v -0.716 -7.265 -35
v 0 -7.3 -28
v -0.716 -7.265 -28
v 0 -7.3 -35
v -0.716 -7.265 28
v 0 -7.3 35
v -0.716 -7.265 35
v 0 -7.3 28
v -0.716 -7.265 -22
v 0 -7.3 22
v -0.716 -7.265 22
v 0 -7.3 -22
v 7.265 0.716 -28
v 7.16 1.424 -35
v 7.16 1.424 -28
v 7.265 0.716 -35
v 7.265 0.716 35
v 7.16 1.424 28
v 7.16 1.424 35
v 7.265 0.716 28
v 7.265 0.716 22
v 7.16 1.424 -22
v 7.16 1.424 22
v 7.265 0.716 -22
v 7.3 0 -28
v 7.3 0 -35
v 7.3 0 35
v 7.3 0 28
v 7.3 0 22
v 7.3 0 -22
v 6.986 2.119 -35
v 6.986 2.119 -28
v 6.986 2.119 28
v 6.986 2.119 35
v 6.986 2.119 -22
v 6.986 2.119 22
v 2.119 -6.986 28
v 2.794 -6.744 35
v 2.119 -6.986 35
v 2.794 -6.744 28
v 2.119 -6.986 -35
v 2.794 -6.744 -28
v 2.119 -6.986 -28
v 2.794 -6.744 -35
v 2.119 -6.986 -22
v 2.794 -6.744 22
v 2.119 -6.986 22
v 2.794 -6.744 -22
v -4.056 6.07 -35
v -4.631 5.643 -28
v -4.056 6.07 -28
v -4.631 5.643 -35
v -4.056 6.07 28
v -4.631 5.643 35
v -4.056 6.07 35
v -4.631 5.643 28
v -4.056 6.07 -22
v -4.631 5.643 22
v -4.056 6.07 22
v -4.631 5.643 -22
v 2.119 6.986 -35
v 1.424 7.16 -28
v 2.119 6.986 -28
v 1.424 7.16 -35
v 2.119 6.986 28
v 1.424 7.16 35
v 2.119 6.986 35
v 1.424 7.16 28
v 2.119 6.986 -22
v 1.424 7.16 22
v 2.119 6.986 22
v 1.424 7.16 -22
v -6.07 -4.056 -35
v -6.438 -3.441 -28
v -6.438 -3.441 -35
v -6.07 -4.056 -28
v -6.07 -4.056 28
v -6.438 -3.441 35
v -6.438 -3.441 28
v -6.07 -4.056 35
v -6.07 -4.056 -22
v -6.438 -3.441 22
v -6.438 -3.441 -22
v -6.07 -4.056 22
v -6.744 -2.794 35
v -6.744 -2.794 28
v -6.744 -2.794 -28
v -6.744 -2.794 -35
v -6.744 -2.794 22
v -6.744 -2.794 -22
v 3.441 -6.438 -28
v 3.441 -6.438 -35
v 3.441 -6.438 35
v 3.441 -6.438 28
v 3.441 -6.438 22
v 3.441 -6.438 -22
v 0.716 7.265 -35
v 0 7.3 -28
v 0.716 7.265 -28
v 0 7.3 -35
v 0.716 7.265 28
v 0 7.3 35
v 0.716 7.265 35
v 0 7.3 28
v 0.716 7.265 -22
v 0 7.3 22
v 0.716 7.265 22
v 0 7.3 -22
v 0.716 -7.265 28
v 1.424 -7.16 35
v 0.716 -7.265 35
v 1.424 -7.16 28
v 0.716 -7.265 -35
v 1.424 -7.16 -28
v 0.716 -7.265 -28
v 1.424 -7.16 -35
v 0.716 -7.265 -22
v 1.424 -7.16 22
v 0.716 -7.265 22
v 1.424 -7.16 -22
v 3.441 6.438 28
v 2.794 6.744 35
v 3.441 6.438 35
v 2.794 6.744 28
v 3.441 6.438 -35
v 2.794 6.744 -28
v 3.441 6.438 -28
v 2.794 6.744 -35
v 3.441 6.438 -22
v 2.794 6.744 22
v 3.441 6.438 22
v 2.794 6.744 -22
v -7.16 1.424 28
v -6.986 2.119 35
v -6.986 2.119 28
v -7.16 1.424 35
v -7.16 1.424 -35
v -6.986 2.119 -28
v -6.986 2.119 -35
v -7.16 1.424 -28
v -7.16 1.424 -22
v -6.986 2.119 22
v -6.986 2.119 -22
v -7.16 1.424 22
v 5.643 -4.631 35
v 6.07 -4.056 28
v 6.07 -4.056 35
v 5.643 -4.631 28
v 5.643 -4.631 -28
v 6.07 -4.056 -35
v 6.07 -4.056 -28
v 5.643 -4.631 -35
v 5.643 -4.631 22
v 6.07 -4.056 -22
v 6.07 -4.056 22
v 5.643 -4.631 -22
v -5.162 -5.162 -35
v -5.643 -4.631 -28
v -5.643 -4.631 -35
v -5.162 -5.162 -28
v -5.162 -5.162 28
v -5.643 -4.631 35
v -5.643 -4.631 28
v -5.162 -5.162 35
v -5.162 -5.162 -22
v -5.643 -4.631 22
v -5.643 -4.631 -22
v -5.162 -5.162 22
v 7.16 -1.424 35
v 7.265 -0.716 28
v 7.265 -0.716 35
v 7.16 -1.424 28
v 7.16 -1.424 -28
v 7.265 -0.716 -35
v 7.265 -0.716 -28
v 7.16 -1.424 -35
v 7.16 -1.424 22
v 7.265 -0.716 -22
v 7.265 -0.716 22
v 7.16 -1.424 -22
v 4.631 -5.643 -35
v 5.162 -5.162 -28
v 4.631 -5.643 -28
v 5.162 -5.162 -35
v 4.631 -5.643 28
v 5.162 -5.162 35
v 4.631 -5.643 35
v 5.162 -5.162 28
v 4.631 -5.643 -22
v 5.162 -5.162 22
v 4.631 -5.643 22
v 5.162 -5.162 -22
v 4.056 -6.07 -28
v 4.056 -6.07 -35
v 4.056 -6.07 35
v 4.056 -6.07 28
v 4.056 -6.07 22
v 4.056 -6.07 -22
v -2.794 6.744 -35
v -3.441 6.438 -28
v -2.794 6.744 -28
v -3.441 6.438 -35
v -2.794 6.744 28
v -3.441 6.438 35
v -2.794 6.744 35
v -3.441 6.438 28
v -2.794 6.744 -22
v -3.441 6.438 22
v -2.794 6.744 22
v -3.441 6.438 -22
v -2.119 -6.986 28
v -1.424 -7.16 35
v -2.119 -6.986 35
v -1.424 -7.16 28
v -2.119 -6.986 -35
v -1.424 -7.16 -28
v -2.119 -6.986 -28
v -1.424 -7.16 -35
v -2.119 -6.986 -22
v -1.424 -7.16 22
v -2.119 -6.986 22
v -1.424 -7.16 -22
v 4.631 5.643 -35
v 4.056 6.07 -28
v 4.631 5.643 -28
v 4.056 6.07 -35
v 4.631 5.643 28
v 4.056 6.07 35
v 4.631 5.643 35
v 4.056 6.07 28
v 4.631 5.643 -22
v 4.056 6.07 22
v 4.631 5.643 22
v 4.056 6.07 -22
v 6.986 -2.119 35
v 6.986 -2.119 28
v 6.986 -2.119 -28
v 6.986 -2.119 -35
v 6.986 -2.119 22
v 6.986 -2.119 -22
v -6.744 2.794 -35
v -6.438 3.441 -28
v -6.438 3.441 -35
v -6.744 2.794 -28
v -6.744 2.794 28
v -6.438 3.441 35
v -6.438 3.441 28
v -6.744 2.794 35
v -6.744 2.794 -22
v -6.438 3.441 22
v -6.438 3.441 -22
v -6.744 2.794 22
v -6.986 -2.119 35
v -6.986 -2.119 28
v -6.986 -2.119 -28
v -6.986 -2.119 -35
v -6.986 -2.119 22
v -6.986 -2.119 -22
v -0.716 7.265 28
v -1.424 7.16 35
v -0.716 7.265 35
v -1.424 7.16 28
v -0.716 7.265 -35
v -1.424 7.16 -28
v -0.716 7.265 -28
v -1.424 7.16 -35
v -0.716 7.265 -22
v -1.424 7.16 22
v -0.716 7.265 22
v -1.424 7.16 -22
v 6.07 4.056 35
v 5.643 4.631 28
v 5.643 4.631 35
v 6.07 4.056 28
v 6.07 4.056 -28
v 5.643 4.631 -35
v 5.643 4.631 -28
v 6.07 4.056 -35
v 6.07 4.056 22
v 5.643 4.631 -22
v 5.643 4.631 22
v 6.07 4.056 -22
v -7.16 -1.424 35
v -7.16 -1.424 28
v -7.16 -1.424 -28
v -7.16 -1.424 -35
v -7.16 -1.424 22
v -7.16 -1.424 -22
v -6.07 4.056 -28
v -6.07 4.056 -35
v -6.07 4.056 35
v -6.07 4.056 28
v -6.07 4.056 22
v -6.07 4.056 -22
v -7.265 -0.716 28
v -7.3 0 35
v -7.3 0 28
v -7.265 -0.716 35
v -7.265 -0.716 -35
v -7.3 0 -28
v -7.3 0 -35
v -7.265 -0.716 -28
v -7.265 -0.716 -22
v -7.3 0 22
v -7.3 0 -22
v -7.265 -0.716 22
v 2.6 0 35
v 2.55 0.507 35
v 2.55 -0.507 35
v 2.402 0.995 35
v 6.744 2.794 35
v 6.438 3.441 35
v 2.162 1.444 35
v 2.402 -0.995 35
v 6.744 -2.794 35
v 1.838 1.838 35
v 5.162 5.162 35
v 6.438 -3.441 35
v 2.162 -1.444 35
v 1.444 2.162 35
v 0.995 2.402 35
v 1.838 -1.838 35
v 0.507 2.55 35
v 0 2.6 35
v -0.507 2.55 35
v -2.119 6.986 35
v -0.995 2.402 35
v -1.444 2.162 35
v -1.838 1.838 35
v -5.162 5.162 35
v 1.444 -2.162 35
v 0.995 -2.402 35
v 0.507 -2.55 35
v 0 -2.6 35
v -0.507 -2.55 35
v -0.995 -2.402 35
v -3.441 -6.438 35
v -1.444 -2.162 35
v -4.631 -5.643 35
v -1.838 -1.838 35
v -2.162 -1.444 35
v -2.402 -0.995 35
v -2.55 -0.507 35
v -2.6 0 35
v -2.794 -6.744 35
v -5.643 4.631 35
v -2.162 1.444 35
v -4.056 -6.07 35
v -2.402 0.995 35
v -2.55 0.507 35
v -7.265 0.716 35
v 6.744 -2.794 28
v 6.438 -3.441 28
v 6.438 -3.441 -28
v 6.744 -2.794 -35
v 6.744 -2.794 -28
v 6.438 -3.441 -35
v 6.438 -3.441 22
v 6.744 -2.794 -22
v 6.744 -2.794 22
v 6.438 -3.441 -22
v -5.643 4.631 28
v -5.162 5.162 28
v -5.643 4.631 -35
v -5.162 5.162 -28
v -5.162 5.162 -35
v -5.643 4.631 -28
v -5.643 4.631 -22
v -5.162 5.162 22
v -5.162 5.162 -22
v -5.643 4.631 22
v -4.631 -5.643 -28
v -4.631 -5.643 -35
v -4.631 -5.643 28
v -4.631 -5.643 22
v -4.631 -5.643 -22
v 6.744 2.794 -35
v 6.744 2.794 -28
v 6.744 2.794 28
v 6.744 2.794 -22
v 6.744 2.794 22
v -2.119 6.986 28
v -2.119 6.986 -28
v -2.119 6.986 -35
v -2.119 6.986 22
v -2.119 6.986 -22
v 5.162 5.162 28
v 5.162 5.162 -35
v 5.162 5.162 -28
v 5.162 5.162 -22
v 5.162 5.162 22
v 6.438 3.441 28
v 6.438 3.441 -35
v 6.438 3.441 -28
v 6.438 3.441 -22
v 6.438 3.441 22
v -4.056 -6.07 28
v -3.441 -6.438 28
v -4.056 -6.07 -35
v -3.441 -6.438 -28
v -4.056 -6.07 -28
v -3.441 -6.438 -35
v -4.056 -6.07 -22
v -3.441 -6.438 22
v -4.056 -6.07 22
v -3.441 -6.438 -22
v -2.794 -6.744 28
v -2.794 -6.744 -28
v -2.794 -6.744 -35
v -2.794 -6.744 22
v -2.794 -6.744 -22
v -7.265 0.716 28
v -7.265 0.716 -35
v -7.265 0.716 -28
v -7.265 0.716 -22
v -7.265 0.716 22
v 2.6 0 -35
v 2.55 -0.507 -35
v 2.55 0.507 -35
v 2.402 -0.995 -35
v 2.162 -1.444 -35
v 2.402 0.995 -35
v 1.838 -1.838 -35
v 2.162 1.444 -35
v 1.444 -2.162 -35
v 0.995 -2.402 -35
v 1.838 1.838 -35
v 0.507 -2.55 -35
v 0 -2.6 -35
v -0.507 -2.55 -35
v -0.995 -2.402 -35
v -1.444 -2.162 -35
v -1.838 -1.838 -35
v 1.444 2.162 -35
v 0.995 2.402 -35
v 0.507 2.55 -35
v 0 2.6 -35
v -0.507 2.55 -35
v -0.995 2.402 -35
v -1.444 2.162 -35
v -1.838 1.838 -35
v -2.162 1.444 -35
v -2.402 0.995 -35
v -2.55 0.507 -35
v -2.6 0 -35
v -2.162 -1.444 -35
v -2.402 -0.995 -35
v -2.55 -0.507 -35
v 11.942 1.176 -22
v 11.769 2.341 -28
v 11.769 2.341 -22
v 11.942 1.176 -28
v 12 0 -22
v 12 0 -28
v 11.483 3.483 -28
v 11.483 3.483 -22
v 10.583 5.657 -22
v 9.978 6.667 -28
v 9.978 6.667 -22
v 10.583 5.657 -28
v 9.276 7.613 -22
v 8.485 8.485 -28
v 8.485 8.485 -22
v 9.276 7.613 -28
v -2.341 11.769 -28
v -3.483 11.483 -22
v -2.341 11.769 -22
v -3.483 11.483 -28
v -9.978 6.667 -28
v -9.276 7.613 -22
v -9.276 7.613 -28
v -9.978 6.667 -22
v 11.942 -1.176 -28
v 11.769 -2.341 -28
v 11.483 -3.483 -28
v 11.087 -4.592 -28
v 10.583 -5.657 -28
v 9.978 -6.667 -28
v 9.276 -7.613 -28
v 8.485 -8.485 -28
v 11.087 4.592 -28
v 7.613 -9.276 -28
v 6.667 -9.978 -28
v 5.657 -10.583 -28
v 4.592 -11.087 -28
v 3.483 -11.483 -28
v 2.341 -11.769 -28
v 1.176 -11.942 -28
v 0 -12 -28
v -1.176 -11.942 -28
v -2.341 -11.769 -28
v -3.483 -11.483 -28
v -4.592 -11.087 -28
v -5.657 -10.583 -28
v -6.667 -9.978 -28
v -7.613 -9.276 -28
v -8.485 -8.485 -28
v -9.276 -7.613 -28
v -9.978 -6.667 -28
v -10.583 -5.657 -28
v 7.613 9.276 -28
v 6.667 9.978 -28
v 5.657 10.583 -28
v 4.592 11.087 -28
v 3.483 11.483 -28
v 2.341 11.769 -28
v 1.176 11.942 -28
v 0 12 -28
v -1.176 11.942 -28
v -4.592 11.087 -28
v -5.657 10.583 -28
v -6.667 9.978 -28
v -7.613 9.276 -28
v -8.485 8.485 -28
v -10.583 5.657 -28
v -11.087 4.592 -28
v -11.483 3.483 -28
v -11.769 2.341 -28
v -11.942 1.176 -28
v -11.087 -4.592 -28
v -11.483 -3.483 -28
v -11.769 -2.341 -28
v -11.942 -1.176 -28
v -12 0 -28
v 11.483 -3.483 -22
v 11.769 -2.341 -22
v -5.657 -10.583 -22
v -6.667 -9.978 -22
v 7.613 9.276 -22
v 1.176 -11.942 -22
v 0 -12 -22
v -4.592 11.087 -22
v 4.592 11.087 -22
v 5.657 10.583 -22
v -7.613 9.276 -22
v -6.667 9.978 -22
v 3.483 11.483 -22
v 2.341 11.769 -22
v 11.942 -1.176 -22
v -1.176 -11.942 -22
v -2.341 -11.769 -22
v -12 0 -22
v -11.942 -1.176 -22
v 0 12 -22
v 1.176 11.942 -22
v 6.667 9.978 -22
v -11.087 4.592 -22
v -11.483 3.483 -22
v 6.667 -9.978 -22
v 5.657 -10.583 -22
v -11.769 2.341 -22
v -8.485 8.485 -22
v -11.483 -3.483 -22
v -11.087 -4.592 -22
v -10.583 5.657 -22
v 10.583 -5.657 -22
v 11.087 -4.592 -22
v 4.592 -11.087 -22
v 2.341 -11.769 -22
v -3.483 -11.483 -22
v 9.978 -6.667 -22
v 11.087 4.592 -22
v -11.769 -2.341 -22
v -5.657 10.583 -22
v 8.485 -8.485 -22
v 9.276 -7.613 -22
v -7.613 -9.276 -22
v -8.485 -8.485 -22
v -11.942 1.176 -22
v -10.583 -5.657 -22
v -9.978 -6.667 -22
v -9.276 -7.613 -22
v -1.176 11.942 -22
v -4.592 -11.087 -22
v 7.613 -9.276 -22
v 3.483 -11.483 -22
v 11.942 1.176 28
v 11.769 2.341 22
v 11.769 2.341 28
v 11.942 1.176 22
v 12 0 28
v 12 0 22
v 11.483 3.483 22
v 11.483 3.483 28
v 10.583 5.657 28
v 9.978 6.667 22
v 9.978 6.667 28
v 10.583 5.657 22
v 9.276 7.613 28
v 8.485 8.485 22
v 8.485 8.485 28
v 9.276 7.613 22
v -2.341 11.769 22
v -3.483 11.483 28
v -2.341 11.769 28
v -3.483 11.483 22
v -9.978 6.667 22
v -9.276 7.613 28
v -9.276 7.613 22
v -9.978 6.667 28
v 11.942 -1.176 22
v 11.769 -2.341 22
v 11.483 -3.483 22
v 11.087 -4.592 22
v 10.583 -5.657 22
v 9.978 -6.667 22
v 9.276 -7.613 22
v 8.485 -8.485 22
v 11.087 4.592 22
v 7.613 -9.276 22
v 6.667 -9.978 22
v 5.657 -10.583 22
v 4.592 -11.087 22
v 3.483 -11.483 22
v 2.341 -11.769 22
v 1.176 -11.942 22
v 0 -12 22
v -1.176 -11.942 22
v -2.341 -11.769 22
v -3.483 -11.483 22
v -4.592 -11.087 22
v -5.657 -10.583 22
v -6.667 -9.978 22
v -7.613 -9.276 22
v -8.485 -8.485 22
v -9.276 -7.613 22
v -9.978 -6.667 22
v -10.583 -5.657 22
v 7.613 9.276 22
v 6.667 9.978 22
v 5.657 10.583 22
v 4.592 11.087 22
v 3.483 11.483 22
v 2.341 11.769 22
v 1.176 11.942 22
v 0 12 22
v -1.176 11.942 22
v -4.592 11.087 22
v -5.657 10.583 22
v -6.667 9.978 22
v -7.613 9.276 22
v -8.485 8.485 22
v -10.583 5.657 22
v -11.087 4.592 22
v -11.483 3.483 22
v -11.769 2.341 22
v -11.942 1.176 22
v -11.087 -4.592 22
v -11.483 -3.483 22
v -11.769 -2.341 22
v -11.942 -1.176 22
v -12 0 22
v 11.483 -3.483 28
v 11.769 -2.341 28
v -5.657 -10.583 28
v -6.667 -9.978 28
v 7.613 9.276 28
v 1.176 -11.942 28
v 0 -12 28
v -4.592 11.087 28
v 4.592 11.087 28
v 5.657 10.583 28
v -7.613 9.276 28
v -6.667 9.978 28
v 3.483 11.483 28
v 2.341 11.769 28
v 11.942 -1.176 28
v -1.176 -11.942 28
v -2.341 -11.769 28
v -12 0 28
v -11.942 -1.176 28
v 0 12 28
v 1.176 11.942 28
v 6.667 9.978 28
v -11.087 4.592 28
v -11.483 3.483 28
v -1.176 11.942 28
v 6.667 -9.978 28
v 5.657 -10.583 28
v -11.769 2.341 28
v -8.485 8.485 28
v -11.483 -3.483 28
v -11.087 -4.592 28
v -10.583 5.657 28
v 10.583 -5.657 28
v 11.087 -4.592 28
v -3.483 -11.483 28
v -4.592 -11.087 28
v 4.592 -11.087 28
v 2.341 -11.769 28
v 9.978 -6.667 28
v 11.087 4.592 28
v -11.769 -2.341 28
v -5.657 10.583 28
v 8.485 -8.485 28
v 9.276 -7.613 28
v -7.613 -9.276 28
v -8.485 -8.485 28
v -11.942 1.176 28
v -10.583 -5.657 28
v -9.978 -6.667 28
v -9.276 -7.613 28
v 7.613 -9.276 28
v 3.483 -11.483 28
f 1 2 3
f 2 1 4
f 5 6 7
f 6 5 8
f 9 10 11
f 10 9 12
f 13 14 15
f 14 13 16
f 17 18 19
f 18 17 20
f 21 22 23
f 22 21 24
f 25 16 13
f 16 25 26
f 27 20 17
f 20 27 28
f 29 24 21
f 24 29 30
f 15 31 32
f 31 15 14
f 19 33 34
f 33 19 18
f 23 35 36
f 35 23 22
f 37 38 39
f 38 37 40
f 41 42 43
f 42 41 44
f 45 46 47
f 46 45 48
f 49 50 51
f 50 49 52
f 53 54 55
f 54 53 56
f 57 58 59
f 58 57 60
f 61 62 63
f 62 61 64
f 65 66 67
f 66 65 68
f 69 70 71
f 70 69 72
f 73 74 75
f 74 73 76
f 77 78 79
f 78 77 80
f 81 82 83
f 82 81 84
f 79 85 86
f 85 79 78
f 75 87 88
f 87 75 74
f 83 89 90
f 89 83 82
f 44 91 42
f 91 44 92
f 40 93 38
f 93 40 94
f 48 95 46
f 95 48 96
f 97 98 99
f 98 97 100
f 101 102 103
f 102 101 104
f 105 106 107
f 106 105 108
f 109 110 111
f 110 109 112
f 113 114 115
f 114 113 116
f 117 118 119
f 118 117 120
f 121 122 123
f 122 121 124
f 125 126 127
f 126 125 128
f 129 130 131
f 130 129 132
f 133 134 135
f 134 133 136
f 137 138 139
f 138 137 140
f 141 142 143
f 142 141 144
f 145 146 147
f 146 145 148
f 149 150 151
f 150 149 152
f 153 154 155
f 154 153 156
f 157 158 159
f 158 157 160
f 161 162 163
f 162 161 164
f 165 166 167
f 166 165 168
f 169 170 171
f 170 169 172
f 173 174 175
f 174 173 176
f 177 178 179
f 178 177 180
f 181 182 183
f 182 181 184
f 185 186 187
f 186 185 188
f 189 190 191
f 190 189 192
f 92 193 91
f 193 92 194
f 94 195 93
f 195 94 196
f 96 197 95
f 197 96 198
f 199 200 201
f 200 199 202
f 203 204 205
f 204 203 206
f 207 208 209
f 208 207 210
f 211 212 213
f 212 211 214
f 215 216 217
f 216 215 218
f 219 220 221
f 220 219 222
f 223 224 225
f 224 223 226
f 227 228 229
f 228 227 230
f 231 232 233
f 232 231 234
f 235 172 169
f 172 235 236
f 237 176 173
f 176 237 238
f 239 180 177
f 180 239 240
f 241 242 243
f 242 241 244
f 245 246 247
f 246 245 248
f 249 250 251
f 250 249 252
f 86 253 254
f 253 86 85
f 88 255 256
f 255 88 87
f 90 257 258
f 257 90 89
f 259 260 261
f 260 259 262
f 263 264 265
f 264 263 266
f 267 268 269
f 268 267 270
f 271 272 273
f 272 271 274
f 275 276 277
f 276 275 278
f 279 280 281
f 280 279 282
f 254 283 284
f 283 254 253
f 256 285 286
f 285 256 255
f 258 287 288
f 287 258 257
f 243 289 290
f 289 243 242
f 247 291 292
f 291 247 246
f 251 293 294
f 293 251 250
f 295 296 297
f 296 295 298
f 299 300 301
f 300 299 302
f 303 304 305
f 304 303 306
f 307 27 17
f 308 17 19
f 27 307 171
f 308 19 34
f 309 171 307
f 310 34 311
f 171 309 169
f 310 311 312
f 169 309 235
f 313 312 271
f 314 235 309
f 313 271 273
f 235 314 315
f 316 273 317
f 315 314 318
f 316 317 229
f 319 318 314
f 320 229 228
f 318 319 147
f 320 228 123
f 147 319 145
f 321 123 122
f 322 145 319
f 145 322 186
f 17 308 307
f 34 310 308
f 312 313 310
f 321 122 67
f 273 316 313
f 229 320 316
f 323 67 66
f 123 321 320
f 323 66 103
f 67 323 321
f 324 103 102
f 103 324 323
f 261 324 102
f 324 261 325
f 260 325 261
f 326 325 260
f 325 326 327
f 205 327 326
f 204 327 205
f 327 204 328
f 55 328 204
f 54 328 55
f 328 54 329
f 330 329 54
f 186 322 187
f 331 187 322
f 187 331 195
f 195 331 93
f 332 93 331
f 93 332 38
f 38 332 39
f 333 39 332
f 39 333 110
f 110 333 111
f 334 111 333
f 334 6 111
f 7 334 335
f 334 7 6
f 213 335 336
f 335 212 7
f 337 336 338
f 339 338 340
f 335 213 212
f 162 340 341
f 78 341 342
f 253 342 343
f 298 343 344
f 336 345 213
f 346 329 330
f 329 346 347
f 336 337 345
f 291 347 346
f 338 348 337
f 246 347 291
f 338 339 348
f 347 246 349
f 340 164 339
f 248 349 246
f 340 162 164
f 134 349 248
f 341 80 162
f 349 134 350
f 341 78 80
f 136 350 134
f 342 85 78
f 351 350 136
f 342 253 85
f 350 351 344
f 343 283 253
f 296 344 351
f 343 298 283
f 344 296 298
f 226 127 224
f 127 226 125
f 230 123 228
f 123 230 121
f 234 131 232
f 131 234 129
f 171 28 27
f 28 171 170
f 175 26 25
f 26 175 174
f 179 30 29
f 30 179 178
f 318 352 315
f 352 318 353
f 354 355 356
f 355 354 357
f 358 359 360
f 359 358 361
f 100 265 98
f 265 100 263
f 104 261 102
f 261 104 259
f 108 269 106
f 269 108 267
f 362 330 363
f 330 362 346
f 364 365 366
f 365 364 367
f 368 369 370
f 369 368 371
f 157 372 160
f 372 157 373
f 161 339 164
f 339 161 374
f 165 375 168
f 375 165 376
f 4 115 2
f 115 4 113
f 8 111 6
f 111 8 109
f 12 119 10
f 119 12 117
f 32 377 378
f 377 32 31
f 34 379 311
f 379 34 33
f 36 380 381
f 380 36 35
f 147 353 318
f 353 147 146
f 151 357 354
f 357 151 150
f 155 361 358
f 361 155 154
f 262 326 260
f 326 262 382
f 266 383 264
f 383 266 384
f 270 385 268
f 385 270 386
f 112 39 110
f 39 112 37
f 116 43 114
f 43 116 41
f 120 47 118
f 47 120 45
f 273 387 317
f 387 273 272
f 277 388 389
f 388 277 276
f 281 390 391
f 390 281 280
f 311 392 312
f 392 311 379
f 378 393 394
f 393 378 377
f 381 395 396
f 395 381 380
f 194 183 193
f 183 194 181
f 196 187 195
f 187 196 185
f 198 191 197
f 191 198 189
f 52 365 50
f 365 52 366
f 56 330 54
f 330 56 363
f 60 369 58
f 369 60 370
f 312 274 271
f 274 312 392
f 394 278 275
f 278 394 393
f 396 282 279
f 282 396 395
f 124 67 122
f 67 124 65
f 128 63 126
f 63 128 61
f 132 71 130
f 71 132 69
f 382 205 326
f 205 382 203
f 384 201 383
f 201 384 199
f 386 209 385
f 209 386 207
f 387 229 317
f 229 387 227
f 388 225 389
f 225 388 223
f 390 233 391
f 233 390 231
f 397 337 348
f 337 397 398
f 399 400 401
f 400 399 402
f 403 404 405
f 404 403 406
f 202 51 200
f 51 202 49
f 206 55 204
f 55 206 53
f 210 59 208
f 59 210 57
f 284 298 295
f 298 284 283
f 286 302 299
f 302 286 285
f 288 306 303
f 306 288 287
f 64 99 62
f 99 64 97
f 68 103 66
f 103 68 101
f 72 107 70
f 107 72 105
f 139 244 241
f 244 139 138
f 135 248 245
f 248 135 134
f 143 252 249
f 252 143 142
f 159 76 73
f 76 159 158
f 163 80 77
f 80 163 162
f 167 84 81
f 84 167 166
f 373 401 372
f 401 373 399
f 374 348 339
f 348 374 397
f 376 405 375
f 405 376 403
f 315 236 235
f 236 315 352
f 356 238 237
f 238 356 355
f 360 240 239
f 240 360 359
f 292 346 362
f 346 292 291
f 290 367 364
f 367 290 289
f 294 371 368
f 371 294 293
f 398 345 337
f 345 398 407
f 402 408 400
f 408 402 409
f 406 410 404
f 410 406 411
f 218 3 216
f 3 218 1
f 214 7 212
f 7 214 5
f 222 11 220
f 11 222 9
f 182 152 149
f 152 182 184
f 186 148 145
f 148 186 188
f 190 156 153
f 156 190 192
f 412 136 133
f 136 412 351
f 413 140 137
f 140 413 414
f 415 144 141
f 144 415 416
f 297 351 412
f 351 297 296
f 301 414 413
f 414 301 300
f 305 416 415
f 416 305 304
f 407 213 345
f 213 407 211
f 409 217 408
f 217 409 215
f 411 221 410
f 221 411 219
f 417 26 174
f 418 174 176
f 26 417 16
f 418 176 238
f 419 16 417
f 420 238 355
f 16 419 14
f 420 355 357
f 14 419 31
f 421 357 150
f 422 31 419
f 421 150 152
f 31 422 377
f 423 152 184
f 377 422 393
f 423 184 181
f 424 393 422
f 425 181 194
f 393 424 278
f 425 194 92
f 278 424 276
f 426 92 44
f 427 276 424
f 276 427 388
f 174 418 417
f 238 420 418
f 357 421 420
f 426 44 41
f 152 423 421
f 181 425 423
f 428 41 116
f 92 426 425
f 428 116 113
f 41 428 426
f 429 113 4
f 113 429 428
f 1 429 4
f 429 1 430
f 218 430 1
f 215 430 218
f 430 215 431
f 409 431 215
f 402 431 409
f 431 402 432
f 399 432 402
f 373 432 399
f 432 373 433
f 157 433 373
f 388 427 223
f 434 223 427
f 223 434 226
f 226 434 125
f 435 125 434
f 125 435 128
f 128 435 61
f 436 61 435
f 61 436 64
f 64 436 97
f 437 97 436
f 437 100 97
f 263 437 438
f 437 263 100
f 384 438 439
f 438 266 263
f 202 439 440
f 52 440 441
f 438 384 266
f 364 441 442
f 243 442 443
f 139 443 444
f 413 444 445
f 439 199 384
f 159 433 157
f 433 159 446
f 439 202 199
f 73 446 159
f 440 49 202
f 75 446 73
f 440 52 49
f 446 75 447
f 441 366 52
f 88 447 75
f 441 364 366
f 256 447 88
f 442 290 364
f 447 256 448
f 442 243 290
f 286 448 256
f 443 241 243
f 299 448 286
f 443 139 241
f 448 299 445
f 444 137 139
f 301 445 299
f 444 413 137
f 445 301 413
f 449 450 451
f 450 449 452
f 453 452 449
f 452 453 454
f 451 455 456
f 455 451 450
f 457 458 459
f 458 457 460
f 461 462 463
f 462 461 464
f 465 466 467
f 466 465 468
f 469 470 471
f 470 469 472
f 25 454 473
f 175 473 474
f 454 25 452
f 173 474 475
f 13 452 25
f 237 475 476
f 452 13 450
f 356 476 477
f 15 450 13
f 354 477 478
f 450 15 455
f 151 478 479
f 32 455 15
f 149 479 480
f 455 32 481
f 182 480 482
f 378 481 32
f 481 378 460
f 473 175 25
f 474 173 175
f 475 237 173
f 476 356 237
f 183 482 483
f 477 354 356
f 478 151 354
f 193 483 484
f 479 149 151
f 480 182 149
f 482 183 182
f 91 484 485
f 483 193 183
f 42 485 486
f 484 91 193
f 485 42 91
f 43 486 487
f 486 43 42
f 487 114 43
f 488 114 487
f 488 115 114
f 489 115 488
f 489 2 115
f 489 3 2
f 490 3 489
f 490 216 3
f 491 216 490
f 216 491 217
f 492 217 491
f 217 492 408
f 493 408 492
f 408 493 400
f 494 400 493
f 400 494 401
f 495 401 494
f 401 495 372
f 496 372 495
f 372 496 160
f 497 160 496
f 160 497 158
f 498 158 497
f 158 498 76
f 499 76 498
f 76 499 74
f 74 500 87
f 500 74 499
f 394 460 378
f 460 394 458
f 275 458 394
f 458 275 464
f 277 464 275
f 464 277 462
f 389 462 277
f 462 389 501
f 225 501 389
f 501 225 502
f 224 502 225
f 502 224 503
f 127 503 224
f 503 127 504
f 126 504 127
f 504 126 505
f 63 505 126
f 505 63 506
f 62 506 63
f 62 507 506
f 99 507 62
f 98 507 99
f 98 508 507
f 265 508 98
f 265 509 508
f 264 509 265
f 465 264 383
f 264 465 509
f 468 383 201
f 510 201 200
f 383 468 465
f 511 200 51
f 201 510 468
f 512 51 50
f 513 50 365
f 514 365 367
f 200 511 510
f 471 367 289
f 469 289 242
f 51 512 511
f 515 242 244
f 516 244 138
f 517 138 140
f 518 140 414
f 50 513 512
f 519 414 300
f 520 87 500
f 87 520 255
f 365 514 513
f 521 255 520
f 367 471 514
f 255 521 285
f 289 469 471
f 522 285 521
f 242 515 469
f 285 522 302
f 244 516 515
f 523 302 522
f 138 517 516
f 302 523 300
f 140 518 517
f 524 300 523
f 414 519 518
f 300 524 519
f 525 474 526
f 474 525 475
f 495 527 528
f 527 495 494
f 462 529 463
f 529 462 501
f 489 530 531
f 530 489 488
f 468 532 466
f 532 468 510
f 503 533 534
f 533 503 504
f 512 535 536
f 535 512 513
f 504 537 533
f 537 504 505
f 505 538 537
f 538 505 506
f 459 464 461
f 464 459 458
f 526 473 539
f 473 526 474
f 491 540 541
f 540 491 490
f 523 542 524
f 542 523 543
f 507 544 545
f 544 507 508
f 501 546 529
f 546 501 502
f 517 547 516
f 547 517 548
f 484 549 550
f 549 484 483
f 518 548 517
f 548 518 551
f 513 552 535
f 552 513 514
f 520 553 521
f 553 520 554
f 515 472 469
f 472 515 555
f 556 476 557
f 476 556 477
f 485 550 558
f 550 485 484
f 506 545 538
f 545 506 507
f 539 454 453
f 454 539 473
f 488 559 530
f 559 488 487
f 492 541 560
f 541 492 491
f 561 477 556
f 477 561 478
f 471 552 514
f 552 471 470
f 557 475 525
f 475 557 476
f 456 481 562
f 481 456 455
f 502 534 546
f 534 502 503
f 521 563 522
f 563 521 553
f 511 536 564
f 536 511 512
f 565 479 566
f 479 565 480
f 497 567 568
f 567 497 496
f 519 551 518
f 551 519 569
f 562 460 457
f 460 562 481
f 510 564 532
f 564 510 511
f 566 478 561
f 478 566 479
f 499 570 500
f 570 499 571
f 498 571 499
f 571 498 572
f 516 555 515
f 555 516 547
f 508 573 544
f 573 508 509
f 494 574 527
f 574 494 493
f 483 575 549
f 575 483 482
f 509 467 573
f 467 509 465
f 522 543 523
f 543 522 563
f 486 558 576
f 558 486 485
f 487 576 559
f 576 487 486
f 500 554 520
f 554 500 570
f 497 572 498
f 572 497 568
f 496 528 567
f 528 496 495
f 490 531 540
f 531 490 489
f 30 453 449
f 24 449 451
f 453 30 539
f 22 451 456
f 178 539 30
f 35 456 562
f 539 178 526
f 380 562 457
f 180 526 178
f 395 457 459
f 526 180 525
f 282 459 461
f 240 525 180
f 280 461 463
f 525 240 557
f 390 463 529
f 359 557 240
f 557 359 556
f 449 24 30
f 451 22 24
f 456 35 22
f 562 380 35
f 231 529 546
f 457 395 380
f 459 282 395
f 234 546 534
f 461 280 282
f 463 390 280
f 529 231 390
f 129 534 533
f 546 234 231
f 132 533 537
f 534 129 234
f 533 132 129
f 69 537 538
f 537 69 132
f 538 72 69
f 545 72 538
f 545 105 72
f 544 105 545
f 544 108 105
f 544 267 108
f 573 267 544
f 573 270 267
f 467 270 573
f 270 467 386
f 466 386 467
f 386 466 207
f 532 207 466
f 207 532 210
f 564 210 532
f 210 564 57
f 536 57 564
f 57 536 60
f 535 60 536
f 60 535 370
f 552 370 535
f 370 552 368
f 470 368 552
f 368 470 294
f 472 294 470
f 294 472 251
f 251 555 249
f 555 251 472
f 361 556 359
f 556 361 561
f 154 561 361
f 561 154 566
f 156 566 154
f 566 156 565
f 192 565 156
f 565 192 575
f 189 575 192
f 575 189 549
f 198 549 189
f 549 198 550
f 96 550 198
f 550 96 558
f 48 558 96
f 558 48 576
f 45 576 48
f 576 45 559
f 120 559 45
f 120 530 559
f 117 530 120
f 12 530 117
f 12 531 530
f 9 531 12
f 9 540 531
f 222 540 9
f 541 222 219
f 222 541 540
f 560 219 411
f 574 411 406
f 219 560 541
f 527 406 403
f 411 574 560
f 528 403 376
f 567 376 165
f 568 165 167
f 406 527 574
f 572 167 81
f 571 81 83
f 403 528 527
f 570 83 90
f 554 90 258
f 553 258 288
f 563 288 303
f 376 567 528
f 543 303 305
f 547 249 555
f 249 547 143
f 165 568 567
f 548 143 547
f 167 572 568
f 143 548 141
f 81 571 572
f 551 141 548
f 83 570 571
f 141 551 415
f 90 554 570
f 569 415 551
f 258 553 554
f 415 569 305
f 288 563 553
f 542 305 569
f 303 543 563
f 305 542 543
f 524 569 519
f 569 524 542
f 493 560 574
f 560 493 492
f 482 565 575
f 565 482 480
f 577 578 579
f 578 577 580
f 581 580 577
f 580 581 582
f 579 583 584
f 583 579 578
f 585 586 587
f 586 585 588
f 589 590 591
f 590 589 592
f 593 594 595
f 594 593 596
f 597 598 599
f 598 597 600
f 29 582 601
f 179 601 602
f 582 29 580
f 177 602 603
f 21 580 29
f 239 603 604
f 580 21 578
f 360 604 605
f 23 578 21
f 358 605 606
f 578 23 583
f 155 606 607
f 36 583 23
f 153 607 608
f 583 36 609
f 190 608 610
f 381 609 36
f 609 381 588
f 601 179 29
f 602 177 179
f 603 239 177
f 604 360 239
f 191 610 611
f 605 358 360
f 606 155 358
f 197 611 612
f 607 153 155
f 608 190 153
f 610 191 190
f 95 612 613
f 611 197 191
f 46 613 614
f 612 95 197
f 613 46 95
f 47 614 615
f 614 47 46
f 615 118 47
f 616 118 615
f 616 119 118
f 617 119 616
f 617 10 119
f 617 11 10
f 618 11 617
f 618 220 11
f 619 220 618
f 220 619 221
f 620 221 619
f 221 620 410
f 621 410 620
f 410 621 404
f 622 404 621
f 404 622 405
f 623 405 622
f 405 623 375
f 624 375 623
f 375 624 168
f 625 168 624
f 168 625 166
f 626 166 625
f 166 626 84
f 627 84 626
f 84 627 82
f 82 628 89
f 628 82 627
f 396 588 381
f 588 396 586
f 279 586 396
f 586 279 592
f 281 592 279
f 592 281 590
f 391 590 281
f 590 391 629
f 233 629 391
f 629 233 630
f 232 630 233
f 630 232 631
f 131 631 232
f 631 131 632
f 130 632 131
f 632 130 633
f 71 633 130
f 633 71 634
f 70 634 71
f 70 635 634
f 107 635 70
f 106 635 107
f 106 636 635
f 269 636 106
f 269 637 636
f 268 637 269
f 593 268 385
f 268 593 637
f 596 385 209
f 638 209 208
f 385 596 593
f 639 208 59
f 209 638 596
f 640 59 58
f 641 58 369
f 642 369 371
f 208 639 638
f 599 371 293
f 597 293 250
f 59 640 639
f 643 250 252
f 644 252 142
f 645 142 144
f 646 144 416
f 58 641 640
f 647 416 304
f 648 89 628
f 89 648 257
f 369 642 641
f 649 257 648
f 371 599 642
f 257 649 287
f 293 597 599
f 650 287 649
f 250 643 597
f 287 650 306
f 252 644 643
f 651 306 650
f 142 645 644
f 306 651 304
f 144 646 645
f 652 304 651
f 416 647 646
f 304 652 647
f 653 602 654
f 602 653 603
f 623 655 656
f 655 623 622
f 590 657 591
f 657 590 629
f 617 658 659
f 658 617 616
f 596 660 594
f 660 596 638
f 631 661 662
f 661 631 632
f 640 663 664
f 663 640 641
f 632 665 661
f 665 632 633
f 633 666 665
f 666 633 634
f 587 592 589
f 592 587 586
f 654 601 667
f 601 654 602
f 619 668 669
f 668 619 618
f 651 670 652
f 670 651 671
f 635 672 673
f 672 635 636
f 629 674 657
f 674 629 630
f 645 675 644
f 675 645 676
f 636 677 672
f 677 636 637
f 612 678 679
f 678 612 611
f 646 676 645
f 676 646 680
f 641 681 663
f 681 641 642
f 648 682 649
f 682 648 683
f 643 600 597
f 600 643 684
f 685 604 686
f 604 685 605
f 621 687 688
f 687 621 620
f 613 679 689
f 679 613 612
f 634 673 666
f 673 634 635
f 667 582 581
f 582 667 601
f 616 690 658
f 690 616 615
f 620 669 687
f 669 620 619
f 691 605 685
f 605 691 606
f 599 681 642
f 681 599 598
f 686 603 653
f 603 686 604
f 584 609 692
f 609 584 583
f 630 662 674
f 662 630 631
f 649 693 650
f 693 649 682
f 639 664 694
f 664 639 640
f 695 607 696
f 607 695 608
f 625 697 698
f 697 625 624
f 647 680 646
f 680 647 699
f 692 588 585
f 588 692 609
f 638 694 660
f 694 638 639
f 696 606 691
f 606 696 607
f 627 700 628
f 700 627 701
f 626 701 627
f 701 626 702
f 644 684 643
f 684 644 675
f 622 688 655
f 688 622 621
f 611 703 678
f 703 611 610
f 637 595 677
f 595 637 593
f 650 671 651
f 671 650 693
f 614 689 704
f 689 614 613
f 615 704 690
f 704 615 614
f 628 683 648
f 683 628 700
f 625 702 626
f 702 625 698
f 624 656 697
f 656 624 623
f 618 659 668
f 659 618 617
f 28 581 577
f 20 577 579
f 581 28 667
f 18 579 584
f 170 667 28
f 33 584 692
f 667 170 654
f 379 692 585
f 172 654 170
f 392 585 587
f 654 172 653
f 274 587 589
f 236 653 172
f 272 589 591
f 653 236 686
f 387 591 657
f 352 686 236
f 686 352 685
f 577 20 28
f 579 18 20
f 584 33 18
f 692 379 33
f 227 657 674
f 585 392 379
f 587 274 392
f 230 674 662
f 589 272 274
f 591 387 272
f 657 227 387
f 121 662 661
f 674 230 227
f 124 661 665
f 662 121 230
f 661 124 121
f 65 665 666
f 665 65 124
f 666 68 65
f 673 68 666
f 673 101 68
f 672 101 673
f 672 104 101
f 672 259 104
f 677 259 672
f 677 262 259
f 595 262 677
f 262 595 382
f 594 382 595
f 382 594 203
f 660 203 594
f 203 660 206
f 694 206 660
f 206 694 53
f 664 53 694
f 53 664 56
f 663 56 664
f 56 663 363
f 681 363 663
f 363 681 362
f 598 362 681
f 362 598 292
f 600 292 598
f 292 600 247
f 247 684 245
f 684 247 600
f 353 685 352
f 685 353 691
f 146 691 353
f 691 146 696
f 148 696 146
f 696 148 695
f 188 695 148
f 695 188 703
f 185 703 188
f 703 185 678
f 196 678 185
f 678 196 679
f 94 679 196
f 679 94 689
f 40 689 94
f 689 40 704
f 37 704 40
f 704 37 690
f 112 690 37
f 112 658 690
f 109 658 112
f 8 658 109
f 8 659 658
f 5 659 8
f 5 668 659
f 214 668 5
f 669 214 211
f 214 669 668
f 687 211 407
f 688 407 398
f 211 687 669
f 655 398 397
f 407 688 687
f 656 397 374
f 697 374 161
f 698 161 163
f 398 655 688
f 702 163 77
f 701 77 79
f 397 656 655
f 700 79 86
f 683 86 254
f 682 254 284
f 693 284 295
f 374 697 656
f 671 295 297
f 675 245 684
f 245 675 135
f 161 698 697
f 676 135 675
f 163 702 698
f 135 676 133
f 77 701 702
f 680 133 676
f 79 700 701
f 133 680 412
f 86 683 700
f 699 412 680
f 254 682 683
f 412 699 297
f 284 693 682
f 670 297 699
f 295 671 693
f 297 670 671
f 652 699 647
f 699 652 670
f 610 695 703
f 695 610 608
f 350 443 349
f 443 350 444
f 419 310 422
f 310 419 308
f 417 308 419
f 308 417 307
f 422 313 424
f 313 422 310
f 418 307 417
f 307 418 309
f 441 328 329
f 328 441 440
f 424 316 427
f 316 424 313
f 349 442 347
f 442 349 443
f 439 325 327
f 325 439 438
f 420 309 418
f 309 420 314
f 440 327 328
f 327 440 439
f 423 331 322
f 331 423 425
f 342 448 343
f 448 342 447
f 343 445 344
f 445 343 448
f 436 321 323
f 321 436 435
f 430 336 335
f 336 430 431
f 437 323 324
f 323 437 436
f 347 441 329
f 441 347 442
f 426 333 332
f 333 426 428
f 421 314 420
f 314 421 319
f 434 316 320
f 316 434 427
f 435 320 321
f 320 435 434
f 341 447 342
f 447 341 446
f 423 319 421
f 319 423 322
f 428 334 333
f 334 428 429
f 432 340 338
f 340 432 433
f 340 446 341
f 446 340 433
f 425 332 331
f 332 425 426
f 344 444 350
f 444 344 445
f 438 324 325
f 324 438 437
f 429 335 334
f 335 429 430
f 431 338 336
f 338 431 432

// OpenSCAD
/*
 * CD/DVD Version - Central HVAT Hub
 * Designed to fit inside the standard 15mm CD/DVD center hole.
 */

module cd_dvd_hvat_hub() {
    difference() {
        union() {
            cylinder(d=14.6, h=70, center=true, $fn=64);   // Fits CD hole
            // Mounting flanges
            translate([0,0,-25]) cylinder(d=24, h=6, center=true, $fn=64);
            translate([0,0, 25]) cylinder(d=24, h=6, center=true, $fn=64);
        }
        cylinder(d=5.2, h=80, center=true, $fn=32);  // Shaft hole
    }
}

cd_dvd_hvat_hub();
